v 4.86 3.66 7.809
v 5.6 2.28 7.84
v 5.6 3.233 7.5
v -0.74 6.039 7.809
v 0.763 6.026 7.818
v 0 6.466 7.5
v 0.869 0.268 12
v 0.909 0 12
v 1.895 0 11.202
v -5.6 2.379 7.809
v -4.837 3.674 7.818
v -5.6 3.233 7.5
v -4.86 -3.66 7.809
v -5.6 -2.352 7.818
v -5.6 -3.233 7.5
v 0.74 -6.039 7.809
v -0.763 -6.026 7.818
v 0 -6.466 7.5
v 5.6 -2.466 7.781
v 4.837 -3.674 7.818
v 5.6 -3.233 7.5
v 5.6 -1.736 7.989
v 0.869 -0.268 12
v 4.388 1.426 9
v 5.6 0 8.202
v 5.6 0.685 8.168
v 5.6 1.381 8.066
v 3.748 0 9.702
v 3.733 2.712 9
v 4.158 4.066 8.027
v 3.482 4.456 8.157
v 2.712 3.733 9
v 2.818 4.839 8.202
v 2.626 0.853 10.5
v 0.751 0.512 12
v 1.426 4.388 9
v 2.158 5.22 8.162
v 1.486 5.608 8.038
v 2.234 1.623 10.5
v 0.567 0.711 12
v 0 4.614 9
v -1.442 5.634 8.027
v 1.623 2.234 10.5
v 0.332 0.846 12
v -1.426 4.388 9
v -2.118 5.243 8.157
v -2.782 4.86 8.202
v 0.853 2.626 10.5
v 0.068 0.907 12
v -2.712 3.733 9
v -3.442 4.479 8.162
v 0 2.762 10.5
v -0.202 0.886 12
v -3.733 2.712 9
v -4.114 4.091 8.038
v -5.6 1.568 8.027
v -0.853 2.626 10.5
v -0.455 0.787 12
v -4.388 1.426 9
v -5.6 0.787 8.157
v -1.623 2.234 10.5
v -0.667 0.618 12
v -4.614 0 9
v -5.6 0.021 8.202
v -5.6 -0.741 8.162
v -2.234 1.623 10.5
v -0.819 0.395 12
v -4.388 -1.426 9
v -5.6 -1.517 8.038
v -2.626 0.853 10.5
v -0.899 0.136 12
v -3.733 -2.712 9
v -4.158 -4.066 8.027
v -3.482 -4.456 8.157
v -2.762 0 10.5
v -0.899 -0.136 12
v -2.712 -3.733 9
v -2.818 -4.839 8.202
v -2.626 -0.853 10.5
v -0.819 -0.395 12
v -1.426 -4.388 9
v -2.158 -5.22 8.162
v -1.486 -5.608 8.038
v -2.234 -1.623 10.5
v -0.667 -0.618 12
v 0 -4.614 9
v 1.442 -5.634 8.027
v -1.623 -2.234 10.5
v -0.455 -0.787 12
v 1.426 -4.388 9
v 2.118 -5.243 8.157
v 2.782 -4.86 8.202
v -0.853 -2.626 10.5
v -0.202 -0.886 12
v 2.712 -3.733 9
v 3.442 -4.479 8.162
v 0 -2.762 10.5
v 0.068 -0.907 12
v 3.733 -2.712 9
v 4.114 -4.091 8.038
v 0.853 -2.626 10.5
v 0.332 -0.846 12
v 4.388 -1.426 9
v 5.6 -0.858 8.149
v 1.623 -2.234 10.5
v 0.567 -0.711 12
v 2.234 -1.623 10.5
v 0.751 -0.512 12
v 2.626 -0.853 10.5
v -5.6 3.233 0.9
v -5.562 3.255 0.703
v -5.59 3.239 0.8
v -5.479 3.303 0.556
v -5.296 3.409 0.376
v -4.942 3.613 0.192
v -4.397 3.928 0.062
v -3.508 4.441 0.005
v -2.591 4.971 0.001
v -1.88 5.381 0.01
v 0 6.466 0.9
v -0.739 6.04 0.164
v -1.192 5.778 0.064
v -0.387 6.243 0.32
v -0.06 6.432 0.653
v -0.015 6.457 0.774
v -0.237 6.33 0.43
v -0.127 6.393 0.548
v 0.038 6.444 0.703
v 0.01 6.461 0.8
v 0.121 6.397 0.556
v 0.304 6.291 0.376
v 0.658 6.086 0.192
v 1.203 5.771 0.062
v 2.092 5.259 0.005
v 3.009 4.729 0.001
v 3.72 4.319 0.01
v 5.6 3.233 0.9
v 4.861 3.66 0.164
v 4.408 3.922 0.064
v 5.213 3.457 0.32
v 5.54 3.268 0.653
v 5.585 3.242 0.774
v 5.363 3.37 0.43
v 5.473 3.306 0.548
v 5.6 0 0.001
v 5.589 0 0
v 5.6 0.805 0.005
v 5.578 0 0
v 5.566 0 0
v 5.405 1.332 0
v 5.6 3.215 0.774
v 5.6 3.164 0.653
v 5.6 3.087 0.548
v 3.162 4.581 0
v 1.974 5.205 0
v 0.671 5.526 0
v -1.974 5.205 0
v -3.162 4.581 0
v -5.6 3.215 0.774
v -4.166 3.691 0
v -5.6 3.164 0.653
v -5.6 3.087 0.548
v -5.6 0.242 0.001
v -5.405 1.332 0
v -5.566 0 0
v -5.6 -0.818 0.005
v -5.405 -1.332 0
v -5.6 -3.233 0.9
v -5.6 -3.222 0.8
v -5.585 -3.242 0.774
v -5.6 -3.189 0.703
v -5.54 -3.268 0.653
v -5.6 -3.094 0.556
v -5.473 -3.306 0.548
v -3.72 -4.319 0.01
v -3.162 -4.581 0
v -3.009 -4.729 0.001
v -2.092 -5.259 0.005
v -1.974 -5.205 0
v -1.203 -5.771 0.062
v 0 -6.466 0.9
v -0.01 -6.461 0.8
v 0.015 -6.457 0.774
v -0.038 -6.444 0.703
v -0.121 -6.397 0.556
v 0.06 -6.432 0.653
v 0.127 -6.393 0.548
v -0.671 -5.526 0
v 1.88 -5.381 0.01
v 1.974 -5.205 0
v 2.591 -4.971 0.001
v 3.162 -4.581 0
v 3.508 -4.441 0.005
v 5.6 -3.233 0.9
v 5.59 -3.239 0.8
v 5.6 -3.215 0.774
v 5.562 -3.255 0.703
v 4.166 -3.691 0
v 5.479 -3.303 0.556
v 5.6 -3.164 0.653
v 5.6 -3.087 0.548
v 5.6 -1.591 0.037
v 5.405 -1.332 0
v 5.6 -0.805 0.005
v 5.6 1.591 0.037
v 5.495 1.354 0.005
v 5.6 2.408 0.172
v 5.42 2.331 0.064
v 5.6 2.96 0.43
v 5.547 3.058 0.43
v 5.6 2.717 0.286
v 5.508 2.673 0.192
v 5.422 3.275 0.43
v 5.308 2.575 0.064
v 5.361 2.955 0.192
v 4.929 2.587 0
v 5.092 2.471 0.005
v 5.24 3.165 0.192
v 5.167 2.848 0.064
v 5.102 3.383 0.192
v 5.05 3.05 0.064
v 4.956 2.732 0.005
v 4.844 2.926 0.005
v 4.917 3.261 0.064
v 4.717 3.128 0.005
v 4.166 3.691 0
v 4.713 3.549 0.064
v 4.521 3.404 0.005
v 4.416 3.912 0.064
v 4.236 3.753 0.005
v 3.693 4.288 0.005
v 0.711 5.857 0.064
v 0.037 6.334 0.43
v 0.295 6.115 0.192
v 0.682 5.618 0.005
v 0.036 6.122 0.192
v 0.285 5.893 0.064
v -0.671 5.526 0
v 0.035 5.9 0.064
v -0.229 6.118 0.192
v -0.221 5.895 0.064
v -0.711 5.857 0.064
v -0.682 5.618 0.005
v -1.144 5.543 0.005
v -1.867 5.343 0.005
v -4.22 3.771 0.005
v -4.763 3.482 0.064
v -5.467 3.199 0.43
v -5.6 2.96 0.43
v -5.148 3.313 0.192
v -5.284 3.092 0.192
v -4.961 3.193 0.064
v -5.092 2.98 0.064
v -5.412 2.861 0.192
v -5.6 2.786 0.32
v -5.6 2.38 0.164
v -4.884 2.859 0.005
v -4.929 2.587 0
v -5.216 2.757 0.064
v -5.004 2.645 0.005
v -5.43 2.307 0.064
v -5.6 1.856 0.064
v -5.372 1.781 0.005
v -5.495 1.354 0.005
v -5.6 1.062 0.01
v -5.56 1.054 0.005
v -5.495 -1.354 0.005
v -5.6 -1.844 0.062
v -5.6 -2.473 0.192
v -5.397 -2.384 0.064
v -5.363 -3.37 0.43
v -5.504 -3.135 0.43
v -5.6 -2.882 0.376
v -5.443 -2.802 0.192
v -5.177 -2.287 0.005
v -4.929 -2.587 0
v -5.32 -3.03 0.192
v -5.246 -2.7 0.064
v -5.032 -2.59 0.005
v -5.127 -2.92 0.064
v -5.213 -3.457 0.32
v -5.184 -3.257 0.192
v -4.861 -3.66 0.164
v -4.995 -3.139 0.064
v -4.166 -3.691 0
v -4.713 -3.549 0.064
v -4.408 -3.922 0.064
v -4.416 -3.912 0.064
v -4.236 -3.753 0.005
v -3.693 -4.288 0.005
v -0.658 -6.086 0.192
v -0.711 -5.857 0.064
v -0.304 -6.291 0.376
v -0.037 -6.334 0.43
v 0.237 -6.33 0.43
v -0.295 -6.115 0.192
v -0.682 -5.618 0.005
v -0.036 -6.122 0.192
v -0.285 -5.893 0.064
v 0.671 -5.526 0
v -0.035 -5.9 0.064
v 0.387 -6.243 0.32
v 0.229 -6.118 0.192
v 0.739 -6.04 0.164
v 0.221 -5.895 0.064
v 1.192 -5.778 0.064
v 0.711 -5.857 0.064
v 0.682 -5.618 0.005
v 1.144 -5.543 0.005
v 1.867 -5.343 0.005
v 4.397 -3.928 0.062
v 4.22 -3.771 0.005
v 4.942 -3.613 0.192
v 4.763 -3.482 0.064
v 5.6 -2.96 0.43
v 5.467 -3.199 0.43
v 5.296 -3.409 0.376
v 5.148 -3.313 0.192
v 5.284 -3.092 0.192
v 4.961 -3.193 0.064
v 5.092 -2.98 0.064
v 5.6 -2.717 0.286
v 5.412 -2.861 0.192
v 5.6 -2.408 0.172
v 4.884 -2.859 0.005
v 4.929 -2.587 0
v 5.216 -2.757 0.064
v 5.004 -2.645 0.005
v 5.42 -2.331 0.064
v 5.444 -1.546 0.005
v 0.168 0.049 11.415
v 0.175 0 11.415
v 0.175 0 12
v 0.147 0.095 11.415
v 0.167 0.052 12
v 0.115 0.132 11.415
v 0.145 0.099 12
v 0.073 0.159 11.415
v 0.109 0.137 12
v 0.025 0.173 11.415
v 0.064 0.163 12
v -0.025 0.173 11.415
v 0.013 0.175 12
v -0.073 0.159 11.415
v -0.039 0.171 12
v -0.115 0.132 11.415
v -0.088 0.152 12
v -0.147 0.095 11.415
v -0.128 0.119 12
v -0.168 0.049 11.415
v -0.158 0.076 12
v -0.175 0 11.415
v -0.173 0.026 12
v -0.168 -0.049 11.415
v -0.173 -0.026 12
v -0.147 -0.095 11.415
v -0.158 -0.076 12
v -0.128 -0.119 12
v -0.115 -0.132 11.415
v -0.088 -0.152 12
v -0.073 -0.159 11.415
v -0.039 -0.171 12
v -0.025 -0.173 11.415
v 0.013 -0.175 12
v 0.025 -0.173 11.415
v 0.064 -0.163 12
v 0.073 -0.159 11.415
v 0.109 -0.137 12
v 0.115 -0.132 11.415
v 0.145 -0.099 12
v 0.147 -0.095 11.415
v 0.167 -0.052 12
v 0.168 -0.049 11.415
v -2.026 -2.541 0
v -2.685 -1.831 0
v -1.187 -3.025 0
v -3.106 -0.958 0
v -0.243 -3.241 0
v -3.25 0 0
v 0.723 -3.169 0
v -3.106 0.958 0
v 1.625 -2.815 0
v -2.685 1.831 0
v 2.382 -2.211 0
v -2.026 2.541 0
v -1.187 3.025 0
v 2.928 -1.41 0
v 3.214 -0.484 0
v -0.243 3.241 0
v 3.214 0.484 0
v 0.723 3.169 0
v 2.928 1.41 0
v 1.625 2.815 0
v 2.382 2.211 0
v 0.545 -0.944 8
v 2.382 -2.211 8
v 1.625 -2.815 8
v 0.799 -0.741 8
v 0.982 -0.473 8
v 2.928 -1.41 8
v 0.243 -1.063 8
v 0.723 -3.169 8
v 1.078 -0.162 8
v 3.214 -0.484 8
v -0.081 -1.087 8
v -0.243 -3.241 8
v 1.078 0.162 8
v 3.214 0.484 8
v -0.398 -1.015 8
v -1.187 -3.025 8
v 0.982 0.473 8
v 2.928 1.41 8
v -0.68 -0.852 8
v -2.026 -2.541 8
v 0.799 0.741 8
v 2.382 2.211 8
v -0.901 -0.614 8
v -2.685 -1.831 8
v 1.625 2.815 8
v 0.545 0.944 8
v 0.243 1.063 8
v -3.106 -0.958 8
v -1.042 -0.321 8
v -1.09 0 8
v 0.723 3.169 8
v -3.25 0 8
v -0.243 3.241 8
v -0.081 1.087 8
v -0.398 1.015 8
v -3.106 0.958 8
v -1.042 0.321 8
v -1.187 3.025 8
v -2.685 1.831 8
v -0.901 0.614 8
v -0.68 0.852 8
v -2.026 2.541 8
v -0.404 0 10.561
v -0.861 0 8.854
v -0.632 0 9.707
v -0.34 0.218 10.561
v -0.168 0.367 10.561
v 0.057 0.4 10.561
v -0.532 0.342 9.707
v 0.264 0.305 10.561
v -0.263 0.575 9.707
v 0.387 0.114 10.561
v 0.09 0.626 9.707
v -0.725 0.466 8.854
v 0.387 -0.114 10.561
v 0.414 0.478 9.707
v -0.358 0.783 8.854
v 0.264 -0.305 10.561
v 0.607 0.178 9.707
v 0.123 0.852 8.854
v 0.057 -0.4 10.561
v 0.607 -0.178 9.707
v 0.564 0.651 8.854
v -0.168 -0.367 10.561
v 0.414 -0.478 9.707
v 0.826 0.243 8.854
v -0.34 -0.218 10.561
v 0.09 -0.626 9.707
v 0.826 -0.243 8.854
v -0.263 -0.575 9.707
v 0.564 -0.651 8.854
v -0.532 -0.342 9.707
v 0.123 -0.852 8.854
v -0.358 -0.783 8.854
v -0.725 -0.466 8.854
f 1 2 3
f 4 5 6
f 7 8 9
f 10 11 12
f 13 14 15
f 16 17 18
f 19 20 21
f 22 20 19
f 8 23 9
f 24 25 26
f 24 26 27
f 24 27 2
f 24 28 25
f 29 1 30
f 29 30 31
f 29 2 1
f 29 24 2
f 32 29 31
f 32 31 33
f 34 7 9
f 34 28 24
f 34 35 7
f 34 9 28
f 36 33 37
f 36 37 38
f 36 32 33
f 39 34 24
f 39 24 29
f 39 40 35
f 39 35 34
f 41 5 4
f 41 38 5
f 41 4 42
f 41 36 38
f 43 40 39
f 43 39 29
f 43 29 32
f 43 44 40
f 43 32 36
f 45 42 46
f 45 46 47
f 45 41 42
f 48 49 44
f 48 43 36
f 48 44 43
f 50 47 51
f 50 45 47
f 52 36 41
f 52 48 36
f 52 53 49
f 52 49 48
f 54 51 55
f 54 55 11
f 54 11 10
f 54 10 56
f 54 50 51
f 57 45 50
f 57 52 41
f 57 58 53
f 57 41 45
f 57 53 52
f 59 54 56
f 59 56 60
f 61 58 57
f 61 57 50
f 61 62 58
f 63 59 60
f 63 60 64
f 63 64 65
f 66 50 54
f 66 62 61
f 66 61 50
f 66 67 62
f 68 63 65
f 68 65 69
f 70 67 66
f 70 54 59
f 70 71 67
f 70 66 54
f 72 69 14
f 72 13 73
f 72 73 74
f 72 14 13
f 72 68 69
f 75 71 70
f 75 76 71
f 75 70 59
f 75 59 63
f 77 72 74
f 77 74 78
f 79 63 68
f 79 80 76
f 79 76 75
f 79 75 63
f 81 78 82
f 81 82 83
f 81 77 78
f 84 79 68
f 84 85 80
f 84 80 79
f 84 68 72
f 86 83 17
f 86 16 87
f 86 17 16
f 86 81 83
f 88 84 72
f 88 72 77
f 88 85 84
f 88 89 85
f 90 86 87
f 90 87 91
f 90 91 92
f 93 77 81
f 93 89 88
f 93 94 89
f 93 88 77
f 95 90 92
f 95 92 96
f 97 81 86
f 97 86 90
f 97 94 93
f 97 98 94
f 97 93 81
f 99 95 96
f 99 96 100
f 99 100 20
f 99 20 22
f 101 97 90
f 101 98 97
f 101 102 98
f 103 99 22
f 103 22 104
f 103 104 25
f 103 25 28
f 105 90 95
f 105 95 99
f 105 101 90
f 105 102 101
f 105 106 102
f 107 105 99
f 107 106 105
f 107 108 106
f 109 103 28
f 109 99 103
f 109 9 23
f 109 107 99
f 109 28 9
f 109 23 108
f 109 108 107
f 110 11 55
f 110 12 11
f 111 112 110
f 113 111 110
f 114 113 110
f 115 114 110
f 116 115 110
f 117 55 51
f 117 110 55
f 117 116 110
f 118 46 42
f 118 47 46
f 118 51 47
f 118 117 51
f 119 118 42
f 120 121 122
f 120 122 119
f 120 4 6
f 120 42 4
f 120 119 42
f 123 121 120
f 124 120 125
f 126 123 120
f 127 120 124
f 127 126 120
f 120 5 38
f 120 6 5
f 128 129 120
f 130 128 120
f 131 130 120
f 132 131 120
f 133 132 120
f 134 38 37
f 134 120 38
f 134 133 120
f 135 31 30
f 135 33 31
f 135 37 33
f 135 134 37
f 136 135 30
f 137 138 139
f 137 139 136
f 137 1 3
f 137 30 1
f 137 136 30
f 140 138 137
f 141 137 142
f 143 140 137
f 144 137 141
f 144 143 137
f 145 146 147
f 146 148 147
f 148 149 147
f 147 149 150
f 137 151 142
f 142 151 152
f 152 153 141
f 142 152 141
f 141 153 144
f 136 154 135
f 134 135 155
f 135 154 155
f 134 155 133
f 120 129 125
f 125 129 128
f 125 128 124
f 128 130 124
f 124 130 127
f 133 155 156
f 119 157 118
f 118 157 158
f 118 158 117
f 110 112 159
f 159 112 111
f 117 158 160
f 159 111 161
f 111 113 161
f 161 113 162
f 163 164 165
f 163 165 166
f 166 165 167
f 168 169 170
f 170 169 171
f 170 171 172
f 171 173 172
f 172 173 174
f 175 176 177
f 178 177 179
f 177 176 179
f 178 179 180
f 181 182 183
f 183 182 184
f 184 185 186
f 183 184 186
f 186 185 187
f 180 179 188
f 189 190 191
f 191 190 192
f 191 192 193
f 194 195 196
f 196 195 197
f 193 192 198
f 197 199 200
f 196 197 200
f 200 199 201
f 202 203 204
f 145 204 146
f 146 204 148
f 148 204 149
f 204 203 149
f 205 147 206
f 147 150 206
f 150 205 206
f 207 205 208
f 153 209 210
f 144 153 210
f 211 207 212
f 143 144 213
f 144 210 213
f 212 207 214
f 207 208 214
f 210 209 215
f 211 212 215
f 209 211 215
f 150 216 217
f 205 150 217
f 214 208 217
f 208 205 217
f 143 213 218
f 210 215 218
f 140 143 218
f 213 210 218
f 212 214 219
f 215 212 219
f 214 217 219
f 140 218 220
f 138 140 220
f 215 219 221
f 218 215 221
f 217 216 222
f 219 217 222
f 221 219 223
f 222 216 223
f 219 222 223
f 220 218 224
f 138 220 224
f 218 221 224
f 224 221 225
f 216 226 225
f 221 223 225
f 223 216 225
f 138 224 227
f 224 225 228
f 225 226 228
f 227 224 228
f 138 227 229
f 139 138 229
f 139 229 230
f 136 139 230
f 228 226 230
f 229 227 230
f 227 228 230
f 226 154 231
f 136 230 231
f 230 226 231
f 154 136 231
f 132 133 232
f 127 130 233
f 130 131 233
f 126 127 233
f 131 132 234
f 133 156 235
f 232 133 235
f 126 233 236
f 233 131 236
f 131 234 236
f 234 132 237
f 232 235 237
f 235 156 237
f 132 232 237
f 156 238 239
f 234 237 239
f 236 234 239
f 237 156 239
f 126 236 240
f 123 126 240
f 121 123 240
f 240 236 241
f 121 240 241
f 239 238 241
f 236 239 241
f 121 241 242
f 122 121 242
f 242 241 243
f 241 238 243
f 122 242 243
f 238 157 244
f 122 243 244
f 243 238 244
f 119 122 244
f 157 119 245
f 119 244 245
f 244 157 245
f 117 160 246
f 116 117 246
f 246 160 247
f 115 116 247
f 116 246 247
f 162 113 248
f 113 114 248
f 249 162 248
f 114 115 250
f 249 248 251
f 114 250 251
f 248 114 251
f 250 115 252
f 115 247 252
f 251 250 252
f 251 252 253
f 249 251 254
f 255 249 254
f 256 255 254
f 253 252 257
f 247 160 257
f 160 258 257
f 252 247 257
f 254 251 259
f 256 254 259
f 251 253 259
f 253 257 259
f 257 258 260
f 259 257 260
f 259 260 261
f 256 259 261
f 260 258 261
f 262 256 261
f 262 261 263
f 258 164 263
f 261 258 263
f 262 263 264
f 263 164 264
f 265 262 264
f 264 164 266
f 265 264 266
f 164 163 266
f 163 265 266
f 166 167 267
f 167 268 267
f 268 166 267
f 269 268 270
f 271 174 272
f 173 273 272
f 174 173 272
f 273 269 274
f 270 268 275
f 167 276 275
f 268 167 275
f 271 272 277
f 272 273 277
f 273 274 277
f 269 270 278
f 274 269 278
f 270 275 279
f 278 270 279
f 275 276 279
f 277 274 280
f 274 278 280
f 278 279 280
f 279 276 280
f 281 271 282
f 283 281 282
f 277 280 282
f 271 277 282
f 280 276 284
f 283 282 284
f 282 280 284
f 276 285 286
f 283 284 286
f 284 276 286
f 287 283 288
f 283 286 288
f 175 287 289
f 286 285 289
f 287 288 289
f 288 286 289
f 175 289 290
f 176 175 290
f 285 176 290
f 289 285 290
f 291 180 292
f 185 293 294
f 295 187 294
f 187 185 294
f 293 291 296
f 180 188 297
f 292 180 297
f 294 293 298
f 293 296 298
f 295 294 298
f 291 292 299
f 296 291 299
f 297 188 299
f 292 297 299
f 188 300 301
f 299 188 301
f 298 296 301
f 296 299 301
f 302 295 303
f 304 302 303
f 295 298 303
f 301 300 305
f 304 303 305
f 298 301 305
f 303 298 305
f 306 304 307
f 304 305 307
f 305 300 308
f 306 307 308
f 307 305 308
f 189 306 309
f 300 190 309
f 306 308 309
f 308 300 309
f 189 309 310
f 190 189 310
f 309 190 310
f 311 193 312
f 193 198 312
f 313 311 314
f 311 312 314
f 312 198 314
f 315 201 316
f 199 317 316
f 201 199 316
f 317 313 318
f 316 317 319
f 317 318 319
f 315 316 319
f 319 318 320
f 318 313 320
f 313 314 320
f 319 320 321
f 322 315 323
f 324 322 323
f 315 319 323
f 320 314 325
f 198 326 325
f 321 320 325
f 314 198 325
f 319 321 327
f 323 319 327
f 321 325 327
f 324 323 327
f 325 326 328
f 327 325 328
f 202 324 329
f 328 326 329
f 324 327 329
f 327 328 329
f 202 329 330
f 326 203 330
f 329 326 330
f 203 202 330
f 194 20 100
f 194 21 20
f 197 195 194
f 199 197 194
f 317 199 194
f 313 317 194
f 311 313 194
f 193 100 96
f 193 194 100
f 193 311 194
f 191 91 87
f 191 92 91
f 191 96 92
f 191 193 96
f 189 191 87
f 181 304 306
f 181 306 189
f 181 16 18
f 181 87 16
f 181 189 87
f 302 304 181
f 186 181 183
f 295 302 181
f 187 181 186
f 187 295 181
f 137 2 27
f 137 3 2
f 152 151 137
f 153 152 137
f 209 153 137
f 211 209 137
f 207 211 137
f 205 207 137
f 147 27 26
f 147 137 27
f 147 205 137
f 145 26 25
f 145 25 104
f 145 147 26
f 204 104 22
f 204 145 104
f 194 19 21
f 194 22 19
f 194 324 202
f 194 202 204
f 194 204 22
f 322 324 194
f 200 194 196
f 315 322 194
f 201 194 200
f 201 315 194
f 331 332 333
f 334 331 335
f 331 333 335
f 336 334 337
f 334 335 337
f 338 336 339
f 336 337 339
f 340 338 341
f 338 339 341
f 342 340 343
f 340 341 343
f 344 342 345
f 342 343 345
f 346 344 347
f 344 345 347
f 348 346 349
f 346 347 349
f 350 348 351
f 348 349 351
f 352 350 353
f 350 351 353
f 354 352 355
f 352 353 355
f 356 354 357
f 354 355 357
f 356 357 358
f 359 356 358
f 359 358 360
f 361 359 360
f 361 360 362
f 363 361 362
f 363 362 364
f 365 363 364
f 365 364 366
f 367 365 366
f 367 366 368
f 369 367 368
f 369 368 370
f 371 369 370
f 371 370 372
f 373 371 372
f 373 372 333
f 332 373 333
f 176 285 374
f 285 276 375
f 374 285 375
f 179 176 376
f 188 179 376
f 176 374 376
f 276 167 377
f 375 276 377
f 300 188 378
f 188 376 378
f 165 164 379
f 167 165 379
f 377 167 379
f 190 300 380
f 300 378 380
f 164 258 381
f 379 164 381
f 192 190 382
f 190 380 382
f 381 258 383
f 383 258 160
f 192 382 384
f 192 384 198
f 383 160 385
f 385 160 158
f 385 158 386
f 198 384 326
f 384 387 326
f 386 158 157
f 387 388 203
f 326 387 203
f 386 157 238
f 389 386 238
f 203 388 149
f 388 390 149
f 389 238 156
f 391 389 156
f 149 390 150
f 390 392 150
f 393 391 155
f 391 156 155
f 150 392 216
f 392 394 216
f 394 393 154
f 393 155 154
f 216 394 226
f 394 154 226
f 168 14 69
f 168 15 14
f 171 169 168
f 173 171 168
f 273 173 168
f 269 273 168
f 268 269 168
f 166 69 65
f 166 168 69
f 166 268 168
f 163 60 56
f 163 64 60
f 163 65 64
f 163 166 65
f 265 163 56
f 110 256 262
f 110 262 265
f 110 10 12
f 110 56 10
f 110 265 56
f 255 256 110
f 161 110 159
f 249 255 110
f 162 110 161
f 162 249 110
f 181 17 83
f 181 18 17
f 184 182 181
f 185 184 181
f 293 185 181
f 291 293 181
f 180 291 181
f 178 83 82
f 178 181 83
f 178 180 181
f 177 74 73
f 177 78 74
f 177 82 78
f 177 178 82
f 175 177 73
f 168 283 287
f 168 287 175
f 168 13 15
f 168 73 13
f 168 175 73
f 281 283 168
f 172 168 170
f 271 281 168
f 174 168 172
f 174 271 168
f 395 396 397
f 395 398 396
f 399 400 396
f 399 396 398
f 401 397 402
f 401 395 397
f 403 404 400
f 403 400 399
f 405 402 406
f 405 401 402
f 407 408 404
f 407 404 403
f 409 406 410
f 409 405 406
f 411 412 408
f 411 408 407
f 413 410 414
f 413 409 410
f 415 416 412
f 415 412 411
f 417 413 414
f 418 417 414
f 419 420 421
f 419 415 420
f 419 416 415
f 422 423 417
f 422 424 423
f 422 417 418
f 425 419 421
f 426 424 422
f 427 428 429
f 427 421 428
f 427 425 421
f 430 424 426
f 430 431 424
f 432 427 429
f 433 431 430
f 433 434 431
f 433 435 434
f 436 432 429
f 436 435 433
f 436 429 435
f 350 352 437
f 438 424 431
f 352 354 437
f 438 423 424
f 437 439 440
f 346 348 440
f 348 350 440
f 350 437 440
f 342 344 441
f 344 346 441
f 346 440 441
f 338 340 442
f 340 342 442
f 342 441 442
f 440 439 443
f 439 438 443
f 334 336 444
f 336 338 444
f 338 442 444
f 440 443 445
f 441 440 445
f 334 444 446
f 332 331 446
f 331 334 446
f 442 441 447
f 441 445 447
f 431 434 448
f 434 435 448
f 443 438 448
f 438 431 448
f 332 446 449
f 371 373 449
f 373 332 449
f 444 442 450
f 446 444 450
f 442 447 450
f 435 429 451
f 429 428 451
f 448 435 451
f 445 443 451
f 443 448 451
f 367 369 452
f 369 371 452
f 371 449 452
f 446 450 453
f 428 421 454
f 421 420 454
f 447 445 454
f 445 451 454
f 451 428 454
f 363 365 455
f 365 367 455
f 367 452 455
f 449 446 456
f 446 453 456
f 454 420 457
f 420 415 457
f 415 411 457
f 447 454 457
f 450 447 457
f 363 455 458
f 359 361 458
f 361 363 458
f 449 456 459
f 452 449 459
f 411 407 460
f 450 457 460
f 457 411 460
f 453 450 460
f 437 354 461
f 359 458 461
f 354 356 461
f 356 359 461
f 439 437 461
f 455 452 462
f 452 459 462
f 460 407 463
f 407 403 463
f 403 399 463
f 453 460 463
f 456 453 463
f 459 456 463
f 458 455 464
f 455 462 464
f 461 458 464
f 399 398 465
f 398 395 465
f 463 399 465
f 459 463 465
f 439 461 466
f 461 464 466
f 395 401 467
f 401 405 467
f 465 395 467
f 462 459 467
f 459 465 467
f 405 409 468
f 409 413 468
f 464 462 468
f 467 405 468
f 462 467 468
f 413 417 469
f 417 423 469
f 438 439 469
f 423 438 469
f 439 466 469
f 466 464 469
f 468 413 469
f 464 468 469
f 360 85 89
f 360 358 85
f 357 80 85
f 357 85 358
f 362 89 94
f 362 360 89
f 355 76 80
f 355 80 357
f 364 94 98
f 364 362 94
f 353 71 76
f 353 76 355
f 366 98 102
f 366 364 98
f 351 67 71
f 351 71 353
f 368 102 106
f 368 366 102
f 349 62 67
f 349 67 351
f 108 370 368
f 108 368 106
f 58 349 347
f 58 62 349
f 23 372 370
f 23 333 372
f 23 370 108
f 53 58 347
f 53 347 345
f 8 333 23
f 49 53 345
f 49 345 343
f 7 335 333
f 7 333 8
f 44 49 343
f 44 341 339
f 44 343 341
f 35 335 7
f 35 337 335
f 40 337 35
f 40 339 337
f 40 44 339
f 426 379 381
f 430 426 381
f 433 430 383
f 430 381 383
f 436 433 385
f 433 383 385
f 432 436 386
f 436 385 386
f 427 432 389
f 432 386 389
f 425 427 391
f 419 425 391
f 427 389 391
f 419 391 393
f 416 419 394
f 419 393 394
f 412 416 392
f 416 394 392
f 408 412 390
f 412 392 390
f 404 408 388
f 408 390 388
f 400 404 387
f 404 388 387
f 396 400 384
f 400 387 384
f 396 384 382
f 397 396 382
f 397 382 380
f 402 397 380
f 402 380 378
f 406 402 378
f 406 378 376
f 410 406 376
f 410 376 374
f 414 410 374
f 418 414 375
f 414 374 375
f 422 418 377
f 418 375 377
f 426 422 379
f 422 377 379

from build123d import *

# Parameters (mm, degrees)
SKETCH_1_R          = 6.466323015
EXTRUDE_1_DEPTH     = 7.5
SKETCH_2_R          = 6.466323015
EXTRUDE_2_DEPTH     = 4.5
EXTRUDE_2_TAPER     = 51
FILLET_1_R          = 0.9
SKETCH_3_OUTSIDE_W  = 19.306
SKETCH_3_OUTSIDE_H  = 19.306
CUT_EXTRUDE_2_DEPTH = 16.087301504
SKETCH_4_R          = 3.25
CUT_EXTRUDE_3_DEPTH = 8
SKETCH_6_R          = 0.175
CUT_EXTRUDE_4_DEPTH = 15.736802168
SKETCH_5_R          = 1.09
CUT_EXTRUDE_5_DEPTH = 3.5
CUT_EXTRUDE_5_DRAFT = -15


with BuildPart() as part:
    # Эскиз1 → Бобышка-Вытянуть1 (new body)
    with BuildSketch(Plane.XY):
        Circle(SKETCH_1_R)
    extrude(amount=EXTRUDE_1_DEPTH)

    # Эскиз2 → Бобышка-Вытянуть2 (add)
    with BuildSketch(Plane.XY.offset(7.5)):
        Circle(SKETCH_2_R)
    extrude(amount=EXTRUDE_2_DEPTH, taper=EXTRUDE_2_TAPER)

    # Скругление1
    fillet_1_edges = [part.edges().sort_by_distance(p)[0] for p in [
        (-6.466323015, 0, 0),
    ]]
    fillet(fillet_1_edges, radius=FILLET_1_R)

    # Эскиз3 outside → Вырез-Вытянуть2 (cut, through all)
    with BuildSketch(Plane(origin=(0, 0, 0), x_dir=(-1, 0, 0), z_dir=(0, 0, -1))):
        Rectangle(SKETCH_3_OUTSIDE_W, SKETCH_3_OUTSIDE_H)
        Polygon((0, 6.466323015), (-5.6, 3.233161507), (-5.6, -3.233161507), (0, -6.466323015), (5.6, -3.233161507), (5.6, 3.233161507), align=None, mode=Mode.SUBTRACT)
    extrude(amount=-CUT_EXTRUDE_2_DEPTH, mode=Mode.SUBTRACT)

    # Эскиз4 → Вырез-Вытянуть3 (cut)
    with BuildSketch(Plane(origin=(0, 0, 0), x_dir=(-1, 0, 0), z_dir=(0, 0, -1))):
        Circle(SKETCH_4_R)
    extrude(amount=-CUT_EXTRUDE_3_DEPTH, mode=Mode.SUBTRACT)

    # Эскиз6 → Вырез-Вытянуть4 (cut, through all)
    with BuildSketch(Plane.XY.offset(12)):
        Circle(SKETCH_6_R)
    extrude(amount=-CUT_EXTRUDE_4_DEPTH, mode=Mode.SUBTRACT)


with BuildPart() as cut_extrude_5_tool:
    # Эскиз5 → Вырез-Вытянуть5 (with draft: the straight prism first)
    with BuildSketch(Plane(origin=(0, 0, 8), x_dir=(-1, 0, 0), z_dir=(0, 0, -1))):
        Circle(SKETCH_5_R)
    extrude(amount=-CUT_EXTRUDE_5_DEPTH)
    # Вырез-Вытянуть5: the draft: its side faces are tilted about the plane it starts from
    cut_extrude_5_sides = [cut_extrude_5_tool.faces().sort_by_distance(p)[0] for p in [
        (1.09, 0, 9.75),
    ]]
    draft(cut_extrude_5_sides, Plane(origin=(0, 0, 8), x_dir=(-1, 0, 0), z_dir=(0, 0, -1)), CUT_EXTRUDE_5_DRAFT)


with BuildPart() as part_1:
    add(part.part)

    # Вырез-Вытянуть5: cut by cut_extrude_5_tool
    add(cut_extrude_5_tool.part, mode=Mode.SUBTRACT)


solid = part_1.part
